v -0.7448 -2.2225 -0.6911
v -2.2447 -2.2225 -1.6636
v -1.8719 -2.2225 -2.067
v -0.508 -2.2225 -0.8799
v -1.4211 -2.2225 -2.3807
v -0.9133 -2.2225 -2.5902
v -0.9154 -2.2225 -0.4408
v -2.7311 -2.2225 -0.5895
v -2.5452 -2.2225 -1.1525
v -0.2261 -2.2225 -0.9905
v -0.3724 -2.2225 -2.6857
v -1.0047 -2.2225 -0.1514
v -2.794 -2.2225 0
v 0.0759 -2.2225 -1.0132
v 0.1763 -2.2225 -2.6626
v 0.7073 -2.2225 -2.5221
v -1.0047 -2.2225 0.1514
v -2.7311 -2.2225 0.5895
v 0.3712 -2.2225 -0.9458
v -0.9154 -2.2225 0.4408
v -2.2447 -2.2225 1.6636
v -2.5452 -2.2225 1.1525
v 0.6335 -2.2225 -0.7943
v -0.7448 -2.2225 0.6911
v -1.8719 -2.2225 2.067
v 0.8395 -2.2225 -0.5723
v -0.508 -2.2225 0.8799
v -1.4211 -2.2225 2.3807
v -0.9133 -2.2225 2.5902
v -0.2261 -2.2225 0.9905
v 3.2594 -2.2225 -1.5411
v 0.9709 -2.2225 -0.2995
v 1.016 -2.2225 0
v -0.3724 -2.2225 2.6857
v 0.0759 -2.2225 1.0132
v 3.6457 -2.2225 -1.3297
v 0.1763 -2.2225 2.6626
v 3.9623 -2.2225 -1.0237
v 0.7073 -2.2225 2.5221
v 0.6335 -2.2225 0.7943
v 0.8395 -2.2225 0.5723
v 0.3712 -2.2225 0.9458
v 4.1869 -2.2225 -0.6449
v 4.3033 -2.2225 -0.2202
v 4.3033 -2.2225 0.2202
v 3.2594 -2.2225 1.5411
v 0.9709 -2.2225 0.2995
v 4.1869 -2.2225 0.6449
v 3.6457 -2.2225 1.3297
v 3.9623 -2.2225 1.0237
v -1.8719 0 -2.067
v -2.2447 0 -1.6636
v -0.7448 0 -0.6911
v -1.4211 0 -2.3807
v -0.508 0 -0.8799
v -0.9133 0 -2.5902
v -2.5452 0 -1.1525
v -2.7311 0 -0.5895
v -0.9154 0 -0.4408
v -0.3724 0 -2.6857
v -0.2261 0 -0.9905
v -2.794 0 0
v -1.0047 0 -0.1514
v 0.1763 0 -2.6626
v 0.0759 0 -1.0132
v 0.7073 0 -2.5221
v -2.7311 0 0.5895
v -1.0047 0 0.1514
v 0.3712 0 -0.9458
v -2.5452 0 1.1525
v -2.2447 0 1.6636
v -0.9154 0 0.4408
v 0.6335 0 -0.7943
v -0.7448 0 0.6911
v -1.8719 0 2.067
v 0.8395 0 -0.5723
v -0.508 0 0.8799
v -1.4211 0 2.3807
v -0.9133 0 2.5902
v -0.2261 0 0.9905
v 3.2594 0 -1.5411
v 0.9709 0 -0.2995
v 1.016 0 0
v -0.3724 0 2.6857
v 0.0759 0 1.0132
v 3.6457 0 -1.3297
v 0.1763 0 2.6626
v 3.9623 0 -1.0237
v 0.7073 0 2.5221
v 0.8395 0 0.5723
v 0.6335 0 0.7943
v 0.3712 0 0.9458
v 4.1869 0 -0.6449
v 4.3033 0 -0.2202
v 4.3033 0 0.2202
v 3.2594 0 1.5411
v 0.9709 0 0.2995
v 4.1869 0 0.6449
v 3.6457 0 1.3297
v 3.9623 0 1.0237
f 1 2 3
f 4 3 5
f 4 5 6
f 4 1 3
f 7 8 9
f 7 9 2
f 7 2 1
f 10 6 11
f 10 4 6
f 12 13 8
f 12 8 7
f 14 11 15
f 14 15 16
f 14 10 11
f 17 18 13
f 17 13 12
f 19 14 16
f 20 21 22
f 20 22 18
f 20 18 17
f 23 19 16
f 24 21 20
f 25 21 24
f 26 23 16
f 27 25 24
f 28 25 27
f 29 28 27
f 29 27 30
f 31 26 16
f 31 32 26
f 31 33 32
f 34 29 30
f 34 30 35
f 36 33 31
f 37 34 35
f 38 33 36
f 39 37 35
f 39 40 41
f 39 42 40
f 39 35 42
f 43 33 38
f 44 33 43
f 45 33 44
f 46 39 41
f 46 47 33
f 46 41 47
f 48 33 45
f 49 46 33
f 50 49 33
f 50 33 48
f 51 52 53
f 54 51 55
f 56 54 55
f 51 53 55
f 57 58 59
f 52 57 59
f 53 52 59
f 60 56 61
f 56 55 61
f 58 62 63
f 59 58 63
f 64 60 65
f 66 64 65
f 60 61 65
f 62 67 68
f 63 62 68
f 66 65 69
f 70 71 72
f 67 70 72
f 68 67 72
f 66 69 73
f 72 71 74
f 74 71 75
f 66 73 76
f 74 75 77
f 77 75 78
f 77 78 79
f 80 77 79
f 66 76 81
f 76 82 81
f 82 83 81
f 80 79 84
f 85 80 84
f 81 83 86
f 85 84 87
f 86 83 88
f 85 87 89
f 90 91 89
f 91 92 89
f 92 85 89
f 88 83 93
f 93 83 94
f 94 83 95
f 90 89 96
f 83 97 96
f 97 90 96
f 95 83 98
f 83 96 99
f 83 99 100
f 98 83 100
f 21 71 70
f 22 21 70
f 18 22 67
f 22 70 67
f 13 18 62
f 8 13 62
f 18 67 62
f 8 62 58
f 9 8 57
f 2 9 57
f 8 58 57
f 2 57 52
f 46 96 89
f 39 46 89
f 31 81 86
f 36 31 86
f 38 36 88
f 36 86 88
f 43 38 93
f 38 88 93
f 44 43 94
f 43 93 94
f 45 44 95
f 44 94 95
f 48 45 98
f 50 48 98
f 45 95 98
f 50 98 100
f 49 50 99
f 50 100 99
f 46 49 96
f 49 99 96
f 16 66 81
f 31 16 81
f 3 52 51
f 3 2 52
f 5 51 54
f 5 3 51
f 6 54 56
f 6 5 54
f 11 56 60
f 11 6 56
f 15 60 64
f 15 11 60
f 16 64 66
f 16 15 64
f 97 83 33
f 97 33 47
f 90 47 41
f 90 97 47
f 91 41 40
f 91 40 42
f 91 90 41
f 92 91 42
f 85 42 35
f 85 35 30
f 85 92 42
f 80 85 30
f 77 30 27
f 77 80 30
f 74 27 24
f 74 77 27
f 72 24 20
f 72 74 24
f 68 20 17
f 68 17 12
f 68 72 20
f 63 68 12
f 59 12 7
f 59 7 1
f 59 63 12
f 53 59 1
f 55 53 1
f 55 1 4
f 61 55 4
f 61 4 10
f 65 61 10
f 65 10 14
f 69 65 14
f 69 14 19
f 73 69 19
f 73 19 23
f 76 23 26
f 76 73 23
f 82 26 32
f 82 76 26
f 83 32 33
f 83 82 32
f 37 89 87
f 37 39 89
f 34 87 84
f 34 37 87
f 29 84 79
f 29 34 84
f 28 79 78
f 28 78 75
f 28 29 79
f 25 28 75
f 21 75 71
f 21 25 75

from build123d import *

# Parameters (mm, degrees)
F0_R     = 1.016
F1_DEPTH = 2.2225
F2_R     = 2.54
F3_R     = 2.54


# Not quite as in the source:
# - a length typed as a fraction of an inch, garbled in the dataset ("3 / 203.2 mm" for 3/8 in), is restored


with BuildPart() as f1:
    # F0 (on Front) → F1 (new body)
    with BuildSketch(Plane.XZ):
        with BuildLine():
            Line((3.2593966339, 1.5410604233), (0, 2.794))
            ThreePointArc((0, 2.794), (-2.794, 0), (0, -2.794))
            Line((0, -2.794), (3.2593966339, -1.5410604233))
            ThreePointArc((3.2593966339, -1.5410604233), (4.318, 0), (3.2593966339, 1.5410604233))
        make_face()
        Circle(F0_R, mode=Mode.SUBTRACT)
    extrude(amount=F1_DEPTH)

    # F2
    f2_edges = [f1.edges().sort_by_distance(p)[0] for p in [
        (0, -1.11125, 2.794),
    ]]
    fillet(f2_edges, radius=F2_R)

    # F3
    f3_edges = [f1.edges().sort_by_distance(p)[0] for p in [
        (0, -1.11125, -2.794),
    ]]
    fillet(f3_edges, radius=F3_R)


solid = f1.part
